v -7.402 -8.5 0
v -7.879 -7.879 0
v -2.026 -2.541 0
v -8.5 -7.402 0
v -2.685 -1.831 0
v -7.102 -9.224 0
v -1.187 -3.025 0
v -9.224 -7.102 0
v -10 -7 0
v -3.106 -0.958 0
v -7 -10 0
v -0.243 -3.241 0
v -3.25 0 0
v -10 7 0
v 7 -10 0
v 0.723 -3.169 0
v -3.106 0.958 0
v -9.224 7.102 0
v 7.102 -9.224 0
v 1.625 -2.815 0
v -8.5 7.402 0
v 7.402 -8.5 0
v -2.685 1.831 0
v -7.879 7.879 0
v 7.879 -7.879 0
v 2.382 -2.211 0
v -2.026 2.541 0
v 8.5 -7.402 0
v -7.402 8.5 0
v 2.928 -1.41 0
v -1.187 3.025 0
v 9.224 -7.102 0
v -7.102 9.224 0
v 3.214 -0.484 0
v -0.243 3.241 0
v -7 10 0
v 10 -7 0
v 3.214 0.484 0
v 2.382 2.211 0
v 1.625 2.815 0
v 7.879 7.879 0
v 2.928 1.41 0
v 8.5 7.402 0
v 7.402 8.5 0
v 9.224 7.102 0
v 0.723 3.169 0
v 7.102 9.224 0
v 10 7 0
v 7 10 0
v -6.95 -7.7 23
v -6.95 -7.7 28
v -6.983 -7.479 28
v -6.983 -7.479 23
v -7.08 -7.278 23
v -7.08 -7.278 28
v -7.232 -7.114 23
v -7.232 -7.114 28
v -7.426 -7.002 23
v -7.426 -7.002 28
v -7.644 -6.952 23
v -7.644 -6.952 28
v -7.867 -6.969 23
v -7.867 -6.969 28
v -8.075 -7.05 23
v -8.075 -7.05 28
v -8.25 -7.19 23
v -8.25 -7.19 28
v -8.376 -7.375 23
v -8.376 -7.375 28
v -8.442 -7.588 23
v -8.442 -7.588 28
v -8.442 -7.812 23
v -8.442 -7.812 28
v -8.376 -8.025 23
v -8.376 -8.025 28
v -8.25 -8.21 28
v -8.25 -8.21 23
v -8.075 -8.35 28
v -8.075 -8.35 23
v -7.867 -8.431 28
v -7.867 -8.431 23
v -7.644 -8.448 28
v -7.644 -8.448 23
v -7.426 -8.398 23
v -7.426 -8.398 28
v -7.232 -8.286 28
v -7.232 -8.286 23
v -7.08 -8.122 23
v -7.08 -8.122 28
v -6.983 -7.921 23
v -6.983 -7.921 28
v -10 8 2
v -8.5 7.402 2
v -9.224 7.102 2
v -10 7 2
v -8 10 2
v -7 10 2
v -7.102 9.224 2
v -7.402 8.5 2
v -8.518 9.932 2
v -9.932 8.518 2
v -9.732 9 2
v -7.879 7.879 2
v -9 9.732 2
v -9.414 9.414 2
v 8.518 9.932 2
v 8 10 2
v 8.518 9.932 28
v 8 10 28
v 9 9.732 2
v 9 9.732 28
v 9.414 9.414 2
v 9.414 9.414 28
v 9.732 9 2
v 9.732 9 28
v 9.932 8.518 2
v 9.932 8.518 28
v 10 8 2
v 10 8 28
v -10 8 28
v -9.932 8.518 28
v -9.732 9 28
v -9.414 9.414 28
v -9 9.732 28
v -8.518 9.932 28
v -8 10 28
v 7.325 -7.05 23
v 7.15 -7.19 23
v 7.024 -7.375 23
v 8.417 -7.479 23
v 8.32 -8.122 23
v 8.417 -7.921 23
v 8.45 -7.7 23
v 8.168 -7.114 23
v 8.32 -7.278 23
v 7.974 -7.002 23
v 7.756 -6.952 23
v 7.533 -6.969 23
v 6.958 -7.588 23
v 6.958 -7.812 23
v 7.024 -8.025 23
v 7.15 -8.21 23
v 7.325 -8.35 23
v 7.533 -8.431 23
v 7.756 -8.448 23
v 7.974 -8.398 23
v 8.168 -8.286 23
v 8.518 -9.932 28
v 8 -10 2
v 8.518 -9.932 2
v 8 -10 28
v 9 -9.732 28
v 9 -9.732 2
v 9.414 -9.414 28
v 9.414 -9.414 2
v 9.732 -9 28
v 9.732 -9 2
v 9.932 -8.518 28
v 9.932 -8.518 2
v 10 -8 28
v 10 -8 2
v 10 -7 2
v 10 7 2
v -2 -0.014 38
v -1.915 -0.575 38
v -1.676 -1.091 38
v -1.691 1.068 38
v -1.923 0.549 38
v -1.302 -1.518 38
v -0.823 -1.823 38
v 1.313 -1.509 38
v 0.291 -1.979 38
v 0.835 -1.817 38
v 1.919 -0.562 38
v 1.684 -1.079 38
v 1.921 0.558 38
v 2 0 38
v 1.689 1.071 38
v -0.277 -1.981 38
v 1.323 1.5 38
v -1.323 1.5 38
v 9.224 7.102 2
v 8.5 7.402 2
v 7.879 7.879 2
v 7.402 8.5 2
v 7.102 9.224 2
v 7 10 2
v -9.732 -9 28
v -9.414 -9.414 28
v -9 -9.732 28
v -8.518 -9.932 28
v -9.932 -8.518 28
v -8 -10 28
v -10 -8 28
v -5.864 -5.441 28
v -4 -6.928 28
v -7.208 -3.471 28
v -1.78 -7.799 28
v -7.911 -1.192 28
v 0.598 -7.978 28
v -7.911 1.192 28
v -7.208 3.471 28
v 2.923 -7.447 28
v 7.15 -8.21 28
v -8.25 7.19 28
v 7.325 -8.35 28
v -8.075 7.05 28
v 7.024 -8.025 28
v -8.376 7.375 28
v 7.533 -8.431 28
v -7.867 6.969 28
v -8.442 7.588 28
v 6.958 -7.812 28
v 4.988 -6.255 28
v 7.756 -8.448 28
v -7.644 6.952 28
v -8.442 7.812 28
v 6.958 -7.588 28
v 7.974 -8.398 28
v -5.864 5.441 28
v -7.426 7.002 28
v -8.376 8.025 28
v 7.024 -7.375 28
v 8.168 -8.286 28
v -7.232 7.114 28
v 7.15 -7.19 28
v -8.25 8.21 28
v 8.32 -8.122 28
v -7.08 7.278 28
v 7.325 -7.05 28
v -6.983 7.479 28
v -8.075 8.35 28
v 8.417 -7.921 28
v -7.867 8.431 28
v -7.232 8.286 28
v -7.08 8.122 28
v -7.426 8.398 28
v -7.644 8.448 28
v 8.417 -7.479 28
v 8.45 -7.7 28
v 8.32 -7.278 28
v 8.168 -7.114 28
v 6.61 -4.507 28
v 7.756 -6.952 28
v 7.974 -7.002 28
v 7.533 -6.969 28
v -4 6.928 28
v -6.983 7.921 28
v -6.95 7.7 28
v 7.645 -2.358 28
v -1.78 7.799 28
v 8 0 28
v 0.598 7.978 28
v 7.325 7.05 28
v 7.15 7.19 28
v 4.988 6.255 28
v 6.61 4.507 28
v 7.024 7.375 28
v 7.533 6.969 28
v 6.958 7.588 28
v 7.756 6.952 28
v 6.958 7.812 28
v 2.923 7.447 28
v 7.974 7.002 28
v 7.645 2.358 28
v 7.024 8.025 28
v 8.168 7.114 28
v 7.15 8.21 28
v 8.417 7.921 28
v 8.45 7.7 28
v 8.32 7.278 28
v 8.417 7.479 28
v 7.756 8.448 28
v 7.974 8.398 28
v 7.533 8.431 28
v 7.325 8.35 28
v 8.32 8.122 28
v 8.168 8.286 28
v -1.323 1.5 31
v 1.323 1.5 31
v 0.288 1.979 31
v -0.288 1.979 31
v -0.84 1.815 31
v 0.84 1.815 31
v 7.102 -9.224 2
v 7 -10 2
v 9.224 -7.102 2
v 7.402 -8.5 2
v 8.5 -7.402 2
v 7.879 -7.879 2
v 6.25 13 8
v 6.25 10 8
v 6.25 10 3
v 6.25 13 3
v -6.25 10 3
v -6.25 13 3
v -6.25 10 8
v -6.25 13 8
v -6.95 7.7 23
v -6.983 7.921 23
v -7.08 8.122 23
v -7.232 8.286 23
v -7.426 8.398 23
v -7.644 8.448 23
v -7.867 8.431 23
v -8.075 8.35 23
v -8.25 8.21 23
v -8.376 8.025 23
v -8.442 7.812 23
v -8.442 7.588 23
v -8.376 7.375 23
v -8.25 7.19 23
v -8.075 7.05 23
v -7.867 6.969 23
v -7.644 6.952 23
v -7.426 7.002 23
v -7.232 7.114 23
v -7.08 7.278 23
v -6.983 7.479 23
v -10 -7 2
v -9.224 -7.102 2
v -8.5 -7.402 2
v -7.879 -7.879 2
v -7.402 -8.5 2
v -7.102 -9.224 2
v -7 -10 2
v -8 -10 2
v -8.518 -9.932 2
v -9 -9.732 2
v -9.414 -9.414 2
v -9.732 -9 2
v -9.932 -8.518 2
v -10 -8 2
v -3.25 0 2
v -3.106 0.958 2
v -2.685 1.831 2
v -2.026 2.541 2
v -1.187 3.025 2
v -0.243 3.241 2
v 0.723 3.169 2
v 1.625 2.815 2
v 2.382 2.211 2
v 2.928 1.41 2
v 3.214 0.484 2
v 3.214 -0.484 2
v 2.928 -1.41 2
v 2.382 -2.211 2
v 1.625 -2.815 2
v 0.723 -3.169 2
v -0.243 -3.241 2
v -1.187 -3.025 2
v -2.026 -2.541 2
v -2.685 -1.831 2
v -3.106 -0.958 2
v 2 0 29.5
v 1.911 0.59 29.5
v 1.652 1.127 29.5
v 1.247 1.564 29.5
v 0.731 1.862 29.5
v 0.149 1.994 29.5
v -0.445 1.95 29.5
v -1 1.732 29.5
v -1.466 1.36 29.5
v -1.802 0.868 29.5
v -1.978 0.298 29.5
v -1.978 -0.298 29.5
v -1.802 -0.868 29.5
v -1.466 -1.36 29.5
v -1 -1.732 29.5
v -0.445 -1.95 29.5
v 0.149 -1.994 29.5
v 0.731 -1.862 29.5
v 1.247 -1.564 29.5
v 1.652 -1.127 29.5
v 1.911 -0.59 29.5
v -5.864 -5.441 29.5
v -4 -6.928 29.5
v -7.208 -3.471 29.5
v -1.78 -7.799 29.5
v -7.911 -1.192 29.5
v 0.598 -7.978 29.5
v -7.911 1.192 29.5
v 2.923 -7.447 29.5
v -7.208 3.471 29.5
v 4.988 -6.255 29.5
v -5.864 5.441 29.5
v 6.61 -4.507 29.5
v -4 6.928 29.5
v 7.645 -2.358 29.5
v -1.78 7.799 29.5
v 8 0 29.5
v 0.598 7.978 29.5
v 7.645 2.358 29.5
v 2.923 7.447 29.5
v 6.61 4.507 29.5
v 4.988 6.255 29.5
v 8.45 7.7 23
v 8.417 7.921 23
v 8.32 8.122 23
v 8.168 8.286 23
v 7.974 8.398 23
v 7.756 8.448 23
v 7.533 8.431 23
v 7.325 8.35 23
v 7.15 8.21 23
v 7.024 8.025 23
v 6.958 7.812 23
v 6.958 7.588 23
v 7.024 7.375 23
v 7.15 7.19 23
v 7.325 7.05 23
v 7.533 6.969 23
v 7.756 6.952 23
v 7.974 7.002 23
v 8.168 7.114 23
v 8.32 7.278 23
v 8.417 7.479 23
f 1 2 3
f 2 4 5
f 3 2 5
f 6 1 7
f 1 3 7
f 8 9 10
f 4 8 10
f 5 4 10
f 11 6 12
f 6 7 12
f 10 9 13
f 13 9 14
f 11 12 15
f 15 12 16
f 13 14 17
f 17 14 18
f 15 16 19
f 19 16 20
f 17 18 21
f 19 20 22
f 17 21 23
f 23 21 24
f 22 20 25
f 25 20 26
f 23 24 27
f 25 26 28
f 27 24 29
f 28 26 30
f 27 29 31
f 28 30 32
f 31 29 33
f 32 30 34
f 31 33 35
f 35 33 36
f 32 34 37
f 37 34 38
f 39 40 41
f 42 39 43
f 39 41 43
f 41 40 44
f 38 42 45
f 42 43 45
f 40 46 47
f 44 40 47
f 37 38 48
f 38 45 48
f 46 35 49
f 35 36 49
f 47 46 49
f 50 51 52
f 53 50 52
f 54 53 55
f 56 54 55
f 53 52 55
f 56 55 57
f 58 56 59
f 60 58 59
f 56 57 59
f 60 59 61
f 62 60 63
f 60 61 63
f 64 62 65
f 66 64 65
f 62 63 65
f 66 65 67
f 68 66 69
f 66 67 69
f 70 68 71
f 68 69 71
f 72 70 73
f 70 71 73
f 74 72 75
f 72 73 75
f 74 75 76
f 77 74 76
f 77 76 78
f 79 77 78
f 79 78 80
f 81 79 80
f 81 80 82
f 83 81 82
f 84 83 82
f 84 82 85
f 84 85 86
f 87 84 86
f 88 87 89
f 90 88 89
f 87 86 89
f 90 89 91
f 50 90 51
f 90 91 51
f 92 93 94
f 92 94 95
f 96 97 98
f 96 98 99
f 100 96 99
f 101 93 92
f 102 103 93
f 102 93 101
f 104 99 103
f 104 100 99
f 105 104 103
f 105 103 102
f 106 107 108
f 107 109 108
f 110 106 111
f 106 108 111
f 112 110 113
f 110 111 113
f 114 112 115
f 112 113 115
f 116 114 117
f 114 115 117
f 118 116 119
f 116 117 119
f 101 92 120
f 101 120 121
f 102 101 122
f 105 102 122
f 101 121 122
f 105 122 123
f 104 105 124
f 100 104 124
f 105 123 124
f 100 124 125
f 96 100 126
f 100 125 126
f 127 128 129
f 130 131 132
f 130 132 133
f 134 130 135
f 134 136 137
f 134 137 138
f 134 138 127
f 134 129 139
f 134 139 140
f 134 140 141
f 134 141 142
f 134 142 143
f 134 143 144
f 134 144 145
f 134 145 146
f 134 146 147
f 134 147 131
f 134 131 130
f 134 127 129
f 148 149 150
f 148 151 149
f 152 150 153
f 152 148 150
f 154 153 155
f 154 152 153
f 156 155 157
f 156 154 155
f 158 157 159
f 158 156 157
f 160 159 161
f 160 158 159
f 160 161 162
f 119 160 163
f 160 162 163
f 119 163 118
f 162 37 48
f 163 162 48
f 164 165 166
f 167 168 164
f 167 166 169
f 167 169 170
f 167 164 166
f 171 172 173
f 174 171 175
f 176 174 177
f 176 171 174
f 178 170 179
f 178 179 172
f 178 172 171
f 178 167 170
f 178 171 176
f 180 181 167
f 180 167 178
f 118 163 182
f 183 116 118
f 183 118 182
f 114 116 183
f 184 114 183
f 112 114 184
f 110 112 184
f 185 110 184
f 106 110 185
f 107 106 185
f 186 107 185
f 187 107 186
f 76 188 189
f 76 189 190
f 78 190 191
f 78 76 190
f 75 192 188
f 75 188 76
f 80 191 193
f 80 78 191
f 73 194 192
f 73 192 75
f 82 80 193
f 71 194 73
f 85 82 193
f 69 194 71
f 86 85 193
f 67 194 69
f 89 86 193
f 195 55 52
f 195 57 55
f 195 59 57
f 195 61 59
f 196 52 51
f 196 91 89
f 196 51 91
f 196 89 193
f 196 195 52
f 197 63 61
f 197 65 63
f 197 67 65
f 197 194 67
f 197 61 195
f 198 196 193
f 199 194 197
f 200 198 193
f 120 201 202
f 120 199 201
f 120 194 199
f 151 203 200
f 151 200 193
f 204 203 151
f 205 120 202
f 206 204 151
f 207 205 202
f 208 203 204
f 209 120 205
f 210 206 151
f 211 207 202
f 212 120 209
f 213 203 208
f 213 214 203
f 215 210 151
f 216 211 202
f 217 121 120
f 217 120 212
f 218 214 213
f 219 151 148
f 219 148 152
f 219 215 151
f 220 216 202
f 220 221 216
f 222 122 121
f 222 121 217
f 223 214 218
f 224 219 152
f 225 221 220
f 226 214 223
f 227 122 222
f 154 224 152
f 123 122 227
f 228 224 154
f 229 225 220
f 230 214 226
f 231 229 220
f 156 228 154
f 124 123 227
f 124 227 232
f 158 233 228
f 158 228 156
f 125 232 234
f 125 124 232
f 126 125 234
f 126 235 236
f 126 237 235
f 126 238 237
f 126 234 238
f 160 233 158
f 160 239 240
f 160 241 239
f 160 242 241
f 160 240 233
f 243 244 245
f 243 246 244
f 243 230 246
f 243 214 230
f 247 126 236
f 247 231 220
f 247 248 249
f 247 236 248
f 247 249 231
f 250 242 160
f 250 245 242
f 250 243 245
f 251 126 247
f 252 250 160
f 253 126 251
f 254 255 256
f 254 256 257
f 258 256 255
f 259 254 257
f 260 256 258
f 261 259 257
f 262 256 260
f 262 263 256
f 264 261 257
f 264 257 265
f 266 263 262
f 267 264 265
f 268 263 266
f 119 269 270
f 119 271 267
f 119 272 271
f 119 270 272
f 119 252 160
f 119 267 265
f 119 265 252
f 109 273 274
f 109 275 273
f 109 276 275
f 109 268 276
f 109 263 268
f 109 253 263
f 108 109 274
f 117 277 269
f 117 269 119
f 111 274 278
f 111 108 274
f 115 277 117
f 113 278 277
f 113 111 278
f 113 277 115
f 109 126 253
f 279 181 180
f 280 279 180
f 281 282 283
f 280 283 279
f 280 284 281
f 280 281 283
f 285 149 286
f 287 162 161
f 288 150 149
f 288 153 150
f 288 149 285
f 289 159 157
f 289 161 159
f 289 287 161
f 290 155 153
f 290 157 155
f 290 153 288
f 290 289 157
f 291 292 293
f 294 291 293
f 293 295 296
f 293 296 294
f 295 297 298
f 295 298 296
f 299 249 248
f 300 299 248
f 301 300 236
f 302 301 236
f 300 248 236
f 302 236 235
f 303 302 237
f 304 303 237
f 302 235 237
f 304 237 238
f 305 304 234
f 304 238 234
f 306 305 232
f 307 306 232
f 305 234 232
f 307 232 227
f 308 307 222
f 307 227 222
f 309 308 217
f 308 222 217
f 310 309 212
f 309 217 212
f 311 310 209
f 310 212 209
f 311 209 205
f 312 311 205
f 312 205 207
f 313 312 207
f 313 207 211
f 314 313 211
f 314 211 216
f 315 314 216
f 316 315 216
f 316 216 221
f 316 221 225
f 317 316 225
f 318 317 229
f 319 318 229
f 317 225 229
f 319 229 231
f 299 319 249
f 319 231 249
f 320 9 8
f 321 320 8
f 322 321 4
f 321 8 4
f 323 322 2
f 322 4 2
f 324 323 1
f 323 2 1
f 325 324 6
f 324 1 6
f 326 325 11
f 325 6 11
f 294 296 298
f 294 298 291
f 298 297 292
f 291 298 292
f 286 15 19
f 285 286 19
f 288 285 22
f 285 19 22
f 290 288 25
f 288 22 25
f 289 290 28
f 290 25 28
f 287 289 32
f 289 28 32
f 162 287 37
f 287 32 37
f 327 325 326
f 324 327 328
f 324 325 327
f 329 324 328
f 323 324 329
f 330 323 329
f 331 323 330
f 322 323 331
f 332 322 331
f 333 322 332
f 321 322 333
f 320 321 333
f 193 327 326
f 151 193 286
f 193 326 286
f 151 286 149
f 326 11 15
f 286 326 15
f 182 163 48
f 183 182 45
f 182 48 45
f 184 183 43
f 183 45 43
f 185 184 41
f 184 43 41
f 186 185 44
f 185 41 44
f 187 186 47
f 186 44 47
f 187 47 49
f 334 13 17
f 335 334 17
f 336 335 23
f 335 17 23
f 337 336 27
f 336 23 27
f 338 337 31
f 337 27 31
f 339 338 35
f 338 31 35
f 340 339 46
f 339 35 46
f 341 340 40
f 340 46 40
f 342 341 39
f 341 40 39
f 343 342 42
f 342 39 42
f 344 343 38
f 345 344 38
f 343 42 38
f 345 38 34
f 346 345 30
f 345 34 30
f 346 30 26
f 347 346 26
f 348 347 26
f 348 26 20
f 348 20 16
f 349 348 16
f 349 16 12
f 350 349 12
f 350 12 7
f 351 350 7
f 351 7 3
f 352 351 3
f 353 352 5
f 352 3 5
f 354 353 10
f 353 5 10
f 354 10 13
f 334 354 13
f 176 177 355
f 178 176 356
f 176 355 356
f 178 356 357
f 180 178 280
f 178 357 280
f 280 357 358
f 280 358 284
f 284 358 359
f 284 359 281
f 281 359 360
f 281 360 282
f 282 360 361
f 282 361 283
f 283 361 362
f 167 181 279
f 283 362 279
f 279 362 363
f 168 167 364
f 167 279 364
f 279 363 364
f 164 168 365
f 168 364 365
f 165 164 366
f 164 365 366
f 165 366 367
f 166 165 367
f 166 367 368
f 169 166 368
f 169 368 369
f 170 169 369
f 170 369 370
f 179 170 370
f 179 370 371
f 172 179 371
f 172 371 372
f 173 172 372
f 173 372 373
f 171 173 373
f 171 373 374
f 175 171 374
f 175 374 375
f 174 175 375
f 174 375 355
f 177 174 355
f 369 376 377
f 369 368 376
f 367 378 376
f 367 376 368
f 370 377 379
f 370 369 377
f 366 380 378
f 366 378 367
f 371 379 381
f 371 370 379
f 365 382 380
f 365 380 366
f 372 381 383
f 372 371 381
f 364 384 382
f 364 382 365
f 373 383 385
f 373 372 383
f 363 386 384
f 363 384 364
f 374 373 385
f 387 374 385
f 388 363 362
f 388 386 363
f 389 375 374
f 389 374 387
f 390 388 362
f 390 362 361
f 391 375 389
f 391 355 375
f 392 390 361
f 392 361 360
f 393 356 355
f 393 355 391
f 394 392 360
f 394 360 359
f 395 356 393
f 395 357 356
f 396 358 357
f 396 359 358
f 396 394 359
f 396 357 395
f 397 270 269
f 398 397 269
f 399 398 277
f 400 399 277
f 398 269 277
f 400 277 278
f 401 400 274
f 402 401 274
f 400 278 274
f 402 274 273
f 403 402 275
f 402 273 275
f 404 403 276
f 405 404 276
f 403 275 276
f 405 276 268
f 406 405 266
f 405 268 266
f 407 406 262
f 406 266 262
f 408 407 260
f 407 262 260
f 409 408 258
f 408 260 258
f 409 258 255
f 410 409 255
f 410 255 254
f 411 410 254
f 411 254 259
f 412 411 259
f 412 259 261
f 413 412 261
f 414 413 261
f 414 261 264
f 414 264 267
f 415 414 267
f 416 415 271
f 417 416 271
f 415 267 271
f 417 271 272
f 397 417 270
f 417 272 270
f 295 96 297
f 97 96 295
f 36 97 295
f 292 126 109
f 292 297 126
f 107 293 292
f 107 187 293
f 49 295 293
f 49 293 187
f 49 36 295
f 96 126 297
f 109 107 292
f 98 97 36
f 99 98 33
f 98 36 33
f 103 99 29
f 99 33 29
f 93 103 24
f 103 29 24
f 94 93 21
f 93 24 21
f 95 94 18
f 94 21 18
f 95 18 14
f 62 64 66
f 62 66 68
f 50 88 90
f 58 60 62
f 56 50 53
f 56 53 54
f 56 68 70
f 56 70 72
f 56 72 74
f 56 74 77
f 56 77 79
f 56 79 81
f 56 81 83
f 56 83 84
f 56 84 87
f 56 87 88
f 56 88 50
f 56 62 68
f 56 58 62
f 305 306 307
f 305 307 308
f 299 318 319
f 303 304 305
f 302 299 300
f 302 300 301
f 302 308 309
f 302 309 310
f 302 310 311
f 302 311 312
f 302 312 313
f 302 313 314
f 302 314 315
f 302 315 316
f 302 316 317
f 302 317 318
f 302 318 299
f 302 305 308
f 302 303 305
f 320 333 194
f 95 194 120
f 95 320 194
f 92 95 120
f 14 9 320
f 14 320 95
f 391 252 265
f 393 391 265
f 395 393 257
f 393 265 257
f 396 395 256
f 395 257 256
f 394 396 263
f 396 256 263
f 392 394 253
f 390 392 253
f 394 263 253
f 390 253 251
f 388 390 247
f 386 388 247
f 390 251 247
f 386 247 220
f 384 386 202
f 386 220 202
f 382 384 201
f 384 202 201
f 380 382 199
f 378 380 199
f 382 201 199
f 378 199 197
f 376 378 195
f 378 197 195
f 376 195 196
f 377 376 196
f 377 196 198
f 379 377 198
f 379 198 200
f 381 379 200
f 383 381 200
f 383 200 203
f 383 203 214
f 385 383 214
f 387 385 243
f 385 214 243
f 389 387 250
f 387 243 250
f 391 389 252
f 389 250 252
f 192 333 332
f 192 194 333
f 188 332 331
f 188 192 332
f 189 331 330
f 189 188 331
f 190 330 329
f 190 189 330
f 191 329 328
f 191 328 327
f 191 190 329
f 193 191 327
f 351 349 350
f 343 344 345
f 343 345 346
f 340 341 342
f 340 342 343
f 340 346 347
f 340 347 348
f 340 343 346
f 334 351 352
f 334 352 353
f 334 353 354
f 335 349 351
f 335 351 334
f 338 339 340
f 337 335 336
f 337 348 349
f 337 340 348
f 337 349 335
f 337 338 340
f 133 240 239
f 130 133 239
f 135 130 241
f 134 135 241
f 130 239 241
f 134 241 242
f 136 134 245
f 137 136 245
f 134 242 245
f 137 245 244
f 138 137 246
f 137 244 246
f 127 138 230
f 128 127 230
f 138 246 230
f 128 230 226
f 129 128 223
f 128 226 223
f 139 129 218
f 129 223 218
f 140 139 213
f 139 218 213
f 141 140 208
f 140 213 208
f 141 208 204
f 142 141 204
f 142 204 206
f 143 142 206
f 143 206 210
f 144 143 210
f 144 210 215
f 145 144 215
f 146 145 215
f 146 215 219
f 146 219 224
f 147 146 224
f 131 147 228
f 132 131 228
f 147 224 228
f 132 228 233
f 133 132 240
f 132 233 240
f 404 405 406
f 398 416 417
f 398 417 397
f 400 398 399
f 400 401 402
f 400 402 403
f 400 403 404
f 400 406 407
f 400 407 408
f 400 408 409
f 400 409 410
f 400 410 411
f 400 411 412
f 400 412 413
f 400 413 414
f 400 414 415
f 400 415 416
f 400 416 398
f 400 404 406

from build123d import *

# Parameters (mm, degrees)
ESBO_O1_W                = 20
ESBO_O1_H                = 20
RESSALTO_EXTRUS_O1_DEPTH = 28
ESBO_O2_R                = 3.25
ESBO_O2_R_2              = 3
CORTE_EXTRUS_O1_DEPTH    = 2
ESBO_O3_W                = 12.5
ESBO_O3_H                = 5
RESSALTO_EXTRUS_O2_DEPTH = 3
FILETE1_R                = 2
ESBO_O4_R                = 8
RESSALTO_EXTRUS_O3_DEPTH = 1.5
ESBO_O5_R                = 2
RESSALTO_EXTRUS_O4_DEPTH = 8.5
ESBO_O6_W                = 5.42124419
ESBO_O6_H                = 2.409441862
CORTE_EXTRUS_O2_DEPTH    = 7
ESBO_O7_R                = 0.75
CORTE_EXTRUS_O3_DEPTH    = 5


with BuildPart() as part:
    # Esboço1 → Ressalto-extrusão1 (new body)
    with BuildSketch(Plane.XY):
        Rectangle(ESBO_O1_W, ESBO_O1_H)
    extrude(amount=RESSALTO_EXTRUS_O1_DEPTH)

    # Esboço2 → Corte-extrusão1 (cut)
    with BuildSketch(Plane(origin=(0, 0, 0), x_dir=(-1, 0, 0), z_dir=(0, 0, -1))):
        Circle(ESBO_O2_R)
        with Locations((-10, 10)):
            Circle(ESBO_O2_R_2)
        with Locations((10, 10)):
            Circle(ESBO_O2_R_2)
        with Locations((10, -10)):
            Circle(ESBO_O2_R_2)
        with Locations((-10, -10)):
            Circle(ESBO_O2_R_2)
    extrude(amount=-CORTE_EXTRUS_O1_DEPTH, mode=Mode.SUBTRACT)

    # Esboço3 → Ressalto-extrusão2 (add)
    with BuildSketch(Plane(origin=(0, 10, 0), x_dir=(1, 0, 0), z_dir=(0, 1, 0))):
        with Locations((0, -5.5)):
            Rectangle(ESBO_O3_W, ESBO_O3_H)
    extrude(amount=RESSALTO_EXTRUS_O2_DEPTH)

    # Filete1
    filete1_edges = [part.edges().sort_by_distance(p)[0] for p in [
        (10, -10, 15),
        (-10, -10, 15),
        (-10, 10, 15),
        (10, 10, 15),
    ]]
    fillet(filete1_edges, radius=FILETE1_R)

    # Esboço4 → Ressalto-extrusão3 (add)
    with BuildSketch(Plane.XY.offset(28)):
        Circle(ESBO_O4_R)
    extrude(amount=RESSALTO_EXTRUS_O3_DEPTH)

    # Esboço5 → Ressalto-extrusão4 (add)
    with BuildSketch(Plane.XY.offset(29.5)):
        Circle(ESBO_O5_R)
    extrude(amount=RESSALTO_EXTRUS_O4_DEPTH)

    # Esboço6 → Corte-extrusão2 (cut)
    with BuildSketch(Plane.XY.offset(38)):
        with Locations((0, 2.704720931)):
            Rectangle(ESBO_O6_W, ESBO_O6_H)
    extrude(amount=-CORTE_EXTRUS_O2_DEPTH, mode=Mode.SUBTRACT)

    # Esboço7 → Corte-extrusão3 (cut)
    with BuildSketch(Plane.XY.offset(28)):
        with Locations((-7.7, 7.7)):
            Circle(ESBO_O7_R)
        with Locations((7.7, 7.7)):
            Circle(ESBO_O7_R)
        with Locations((7.7, -7.7)):
            Circle(ESBO_O7_R)
        with Locations((-7.7, -7.7)):
            Circle(ESBO_O7_R)
    extrude(amount=-CORTE_EXTRUS_O3_DEPTH, mode=Mode.SUBTRACT)


solid = part.part
